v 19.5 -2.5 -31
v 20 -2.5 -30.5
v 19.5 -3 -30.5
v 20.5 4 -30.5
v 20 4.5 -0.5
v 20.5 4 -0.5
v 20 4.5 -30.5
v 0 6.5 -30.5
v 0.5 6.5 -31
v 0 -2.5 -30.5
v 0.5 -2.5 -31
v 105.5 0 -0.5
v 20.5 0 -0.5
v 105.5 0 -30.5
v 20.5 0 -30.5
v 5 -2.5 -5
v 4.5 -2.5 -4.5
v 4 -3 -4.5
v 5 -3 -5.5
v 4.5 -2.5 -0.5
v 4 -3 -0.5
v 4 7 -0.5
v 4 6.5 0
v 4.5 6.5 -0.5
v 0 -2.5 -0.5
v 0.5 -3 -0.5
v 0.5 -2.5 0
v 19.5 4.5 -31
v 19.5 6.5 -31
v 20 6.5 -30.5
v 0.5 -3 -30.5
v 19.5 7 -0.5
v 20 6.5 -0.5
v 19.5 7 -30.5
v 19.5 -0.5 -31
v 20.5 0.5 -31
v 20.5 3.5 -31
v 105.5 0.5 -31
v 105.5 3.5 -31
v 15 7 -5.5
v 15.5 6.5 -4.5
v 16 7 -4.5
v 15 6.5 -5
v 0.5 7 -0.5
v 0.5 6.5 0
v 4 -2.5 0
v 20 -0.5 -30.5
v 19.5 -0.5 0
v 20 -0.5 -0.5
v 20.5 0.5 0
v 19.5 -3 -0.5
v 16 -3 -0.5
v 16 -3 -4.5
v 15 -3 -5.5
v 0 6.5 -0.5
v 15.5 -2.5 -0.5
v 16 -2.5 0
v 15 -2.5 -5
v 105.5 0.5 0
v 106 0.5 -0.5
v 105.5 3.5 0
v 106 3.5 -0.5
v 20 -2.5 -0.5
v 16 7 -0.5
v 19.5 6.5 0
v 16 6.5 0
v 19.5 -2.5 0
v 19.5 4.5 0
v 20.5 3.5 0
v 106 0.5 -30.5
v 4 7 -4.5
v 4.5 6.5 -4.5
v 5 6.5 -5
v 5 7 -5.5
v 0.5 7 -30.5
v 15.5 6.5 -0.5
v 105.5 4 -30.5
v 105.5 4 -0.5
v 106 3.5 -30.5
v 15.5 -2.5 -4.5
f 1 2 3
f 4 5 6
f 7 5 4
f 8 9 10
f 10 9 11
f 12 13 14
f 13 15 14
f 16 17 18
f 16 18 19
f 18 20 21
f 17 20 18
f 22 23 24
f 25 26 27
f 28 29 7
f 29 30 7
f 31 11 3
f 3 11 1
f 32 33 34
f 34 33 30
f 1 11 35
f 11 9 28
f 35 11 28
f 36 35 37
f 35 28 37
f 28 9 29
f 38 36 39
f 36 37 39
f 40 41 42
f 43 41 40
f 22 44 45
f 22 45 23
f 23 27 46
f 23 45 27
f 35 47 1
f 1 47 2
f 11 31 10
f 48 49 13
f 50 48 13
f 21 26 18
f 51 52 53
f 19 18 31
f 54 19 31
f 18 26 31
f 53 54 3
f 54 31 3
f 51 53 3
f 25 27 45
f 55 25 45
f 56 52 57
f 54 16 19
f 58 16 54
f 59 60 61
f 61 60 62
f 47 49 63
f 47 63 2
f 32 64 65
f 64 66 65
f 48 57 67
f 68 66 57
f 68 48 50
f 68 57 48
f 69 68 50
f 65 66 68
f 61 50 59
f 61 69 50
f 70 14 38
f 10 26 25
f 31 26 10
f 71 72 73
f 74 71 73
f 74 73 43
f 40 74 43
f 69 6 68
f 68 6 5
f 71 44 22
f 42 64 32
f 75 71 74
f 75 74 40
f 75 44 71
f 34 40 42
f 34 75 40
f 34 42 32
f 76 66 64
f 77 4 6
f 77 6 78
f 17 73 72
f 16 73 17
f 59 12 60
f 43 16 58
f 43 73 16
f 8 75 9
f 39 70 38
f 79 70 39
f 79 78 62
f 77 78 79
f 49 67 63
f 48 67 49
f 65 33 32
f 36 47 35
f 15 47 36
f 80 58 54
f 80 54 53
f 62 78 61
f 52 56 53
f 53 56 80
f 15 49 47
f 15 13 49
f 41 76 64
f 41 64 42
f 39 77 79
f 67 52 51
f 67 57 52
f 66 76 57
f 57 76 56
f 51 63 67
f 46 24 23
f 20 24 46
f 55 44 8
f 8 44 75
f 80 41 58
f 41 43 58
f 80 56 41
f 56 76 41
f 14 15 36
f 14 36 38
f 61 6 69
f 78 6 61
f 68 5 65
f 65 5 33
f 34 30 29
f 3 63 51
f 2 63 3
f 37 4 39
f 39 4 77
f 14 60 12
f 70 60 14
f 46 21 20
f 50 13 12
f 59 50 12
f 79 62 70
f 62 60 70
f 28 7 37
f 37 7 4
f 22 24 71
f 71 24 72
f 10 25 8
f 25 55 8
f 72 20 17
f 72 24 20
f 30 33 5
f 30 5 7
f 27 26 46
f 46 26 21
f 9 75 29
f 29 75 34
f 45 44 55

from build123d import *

# Parameters (mm, degrees)
SKETCH1_W           = 106
SKETCH1_H           = 31
BOSS_EXTRUDE1_DEPTH = 4
SKETCH2_W           = 20
SKETCH2_H           = 31
BOSS_EXTRUDE2_DEPTH = 5
SKETCH3_W           = 11
SKETCH3_H           = 5
CUT_EXTRUDE1_DEPTH  = 11
CHAMFER1_SIZE       = 0.5


with BuildPart() as part:
    # Sketch1 → Boss-Extrude1 (new body)
    with BuildSketch(Plane(origin=(0, 0, 0), x_dir=(1, 0, 0), z_dir=(0, 1, 0))):
        with Locations((53, 15.5)):
            Rectangle(SKETCH1_W, SKETCH1_H)
    extrude(amount=BOSS_EXTRUDE1_DEPTH)

    # Sketch2 → Boss-Extrude2 (add, symmetric)
    with BuildSketch(Plane(origin=(0, 2, 0), x_dir=(1, 0, 0), z_dir=(0, 1, 0))):
        with Locations((10, 15.5)):
            Rectangle(SKETCH2_W, SKETCH2_H)
    extrude(amount=BOSS_EXTRUDE2_DEPTH, both=True)

    # Sketch3 → Cut-Extrude1 (cut, through all)
    with BuildSketch(Plane(origin=(0, 7, 0), x_dir=(1, 0, 0), z_dir=(0, 1, 0))):
        with Locations((10, 2.5)):
            Rectangle(SKETCH3_W, SKETCH3_H)
    extrude(amount=-CUT_EXTRUDE1_DEPTH, mode=Mode.SUBTRACT)

    # Chamfer1
    chamfer1_edges = [part.edges().sort_by_distance(p)[0] for p in [
        (106, 4, -15.5),
        (63, 0, 0),
        (20, 0, -15.5),
        (63, 4, 0),
        (63, 4, -31),
        (20, 5.5, 0),
        (20, 4, -15.5),
        (20, 5.5, -31),
        (0, -3, -15.5),
        (2.25, -3, 0),
        (20, -1.5, 0),
        (20, -3, -15.5),
        (20, -1.5, -31),
        (10, -3, -31),
        (0, 7, -15.5),
        (2.25, 7, 0),
        (20, 7, -15.5),
        (10, 7, -31),
        (17.75, 7, 0),
        (17.75, -3, 0),
        (4.5, -3, -2.5),
        (4.5, 2, 0),
        (10, -3, -5),
        (4.5, 2, -5),
        (15.5, -3, -2.5),
        (15.5, 2, -5),
        (15.5, 2, 0),
        (4.5, 7, -2.5),
        (15.5, 7, -2.5),
        (10, 7, -5),
        (63, 0, -31),
        (106, 0, -15.5),
        (0, 2, -31),
        (106, 2, -31),
        (106, 2, 0),
        (0, 2, 0),
    ]]
    chamfer(chamfer1_edges, length=CHAMFER1_SIZE)


solid = part.part
